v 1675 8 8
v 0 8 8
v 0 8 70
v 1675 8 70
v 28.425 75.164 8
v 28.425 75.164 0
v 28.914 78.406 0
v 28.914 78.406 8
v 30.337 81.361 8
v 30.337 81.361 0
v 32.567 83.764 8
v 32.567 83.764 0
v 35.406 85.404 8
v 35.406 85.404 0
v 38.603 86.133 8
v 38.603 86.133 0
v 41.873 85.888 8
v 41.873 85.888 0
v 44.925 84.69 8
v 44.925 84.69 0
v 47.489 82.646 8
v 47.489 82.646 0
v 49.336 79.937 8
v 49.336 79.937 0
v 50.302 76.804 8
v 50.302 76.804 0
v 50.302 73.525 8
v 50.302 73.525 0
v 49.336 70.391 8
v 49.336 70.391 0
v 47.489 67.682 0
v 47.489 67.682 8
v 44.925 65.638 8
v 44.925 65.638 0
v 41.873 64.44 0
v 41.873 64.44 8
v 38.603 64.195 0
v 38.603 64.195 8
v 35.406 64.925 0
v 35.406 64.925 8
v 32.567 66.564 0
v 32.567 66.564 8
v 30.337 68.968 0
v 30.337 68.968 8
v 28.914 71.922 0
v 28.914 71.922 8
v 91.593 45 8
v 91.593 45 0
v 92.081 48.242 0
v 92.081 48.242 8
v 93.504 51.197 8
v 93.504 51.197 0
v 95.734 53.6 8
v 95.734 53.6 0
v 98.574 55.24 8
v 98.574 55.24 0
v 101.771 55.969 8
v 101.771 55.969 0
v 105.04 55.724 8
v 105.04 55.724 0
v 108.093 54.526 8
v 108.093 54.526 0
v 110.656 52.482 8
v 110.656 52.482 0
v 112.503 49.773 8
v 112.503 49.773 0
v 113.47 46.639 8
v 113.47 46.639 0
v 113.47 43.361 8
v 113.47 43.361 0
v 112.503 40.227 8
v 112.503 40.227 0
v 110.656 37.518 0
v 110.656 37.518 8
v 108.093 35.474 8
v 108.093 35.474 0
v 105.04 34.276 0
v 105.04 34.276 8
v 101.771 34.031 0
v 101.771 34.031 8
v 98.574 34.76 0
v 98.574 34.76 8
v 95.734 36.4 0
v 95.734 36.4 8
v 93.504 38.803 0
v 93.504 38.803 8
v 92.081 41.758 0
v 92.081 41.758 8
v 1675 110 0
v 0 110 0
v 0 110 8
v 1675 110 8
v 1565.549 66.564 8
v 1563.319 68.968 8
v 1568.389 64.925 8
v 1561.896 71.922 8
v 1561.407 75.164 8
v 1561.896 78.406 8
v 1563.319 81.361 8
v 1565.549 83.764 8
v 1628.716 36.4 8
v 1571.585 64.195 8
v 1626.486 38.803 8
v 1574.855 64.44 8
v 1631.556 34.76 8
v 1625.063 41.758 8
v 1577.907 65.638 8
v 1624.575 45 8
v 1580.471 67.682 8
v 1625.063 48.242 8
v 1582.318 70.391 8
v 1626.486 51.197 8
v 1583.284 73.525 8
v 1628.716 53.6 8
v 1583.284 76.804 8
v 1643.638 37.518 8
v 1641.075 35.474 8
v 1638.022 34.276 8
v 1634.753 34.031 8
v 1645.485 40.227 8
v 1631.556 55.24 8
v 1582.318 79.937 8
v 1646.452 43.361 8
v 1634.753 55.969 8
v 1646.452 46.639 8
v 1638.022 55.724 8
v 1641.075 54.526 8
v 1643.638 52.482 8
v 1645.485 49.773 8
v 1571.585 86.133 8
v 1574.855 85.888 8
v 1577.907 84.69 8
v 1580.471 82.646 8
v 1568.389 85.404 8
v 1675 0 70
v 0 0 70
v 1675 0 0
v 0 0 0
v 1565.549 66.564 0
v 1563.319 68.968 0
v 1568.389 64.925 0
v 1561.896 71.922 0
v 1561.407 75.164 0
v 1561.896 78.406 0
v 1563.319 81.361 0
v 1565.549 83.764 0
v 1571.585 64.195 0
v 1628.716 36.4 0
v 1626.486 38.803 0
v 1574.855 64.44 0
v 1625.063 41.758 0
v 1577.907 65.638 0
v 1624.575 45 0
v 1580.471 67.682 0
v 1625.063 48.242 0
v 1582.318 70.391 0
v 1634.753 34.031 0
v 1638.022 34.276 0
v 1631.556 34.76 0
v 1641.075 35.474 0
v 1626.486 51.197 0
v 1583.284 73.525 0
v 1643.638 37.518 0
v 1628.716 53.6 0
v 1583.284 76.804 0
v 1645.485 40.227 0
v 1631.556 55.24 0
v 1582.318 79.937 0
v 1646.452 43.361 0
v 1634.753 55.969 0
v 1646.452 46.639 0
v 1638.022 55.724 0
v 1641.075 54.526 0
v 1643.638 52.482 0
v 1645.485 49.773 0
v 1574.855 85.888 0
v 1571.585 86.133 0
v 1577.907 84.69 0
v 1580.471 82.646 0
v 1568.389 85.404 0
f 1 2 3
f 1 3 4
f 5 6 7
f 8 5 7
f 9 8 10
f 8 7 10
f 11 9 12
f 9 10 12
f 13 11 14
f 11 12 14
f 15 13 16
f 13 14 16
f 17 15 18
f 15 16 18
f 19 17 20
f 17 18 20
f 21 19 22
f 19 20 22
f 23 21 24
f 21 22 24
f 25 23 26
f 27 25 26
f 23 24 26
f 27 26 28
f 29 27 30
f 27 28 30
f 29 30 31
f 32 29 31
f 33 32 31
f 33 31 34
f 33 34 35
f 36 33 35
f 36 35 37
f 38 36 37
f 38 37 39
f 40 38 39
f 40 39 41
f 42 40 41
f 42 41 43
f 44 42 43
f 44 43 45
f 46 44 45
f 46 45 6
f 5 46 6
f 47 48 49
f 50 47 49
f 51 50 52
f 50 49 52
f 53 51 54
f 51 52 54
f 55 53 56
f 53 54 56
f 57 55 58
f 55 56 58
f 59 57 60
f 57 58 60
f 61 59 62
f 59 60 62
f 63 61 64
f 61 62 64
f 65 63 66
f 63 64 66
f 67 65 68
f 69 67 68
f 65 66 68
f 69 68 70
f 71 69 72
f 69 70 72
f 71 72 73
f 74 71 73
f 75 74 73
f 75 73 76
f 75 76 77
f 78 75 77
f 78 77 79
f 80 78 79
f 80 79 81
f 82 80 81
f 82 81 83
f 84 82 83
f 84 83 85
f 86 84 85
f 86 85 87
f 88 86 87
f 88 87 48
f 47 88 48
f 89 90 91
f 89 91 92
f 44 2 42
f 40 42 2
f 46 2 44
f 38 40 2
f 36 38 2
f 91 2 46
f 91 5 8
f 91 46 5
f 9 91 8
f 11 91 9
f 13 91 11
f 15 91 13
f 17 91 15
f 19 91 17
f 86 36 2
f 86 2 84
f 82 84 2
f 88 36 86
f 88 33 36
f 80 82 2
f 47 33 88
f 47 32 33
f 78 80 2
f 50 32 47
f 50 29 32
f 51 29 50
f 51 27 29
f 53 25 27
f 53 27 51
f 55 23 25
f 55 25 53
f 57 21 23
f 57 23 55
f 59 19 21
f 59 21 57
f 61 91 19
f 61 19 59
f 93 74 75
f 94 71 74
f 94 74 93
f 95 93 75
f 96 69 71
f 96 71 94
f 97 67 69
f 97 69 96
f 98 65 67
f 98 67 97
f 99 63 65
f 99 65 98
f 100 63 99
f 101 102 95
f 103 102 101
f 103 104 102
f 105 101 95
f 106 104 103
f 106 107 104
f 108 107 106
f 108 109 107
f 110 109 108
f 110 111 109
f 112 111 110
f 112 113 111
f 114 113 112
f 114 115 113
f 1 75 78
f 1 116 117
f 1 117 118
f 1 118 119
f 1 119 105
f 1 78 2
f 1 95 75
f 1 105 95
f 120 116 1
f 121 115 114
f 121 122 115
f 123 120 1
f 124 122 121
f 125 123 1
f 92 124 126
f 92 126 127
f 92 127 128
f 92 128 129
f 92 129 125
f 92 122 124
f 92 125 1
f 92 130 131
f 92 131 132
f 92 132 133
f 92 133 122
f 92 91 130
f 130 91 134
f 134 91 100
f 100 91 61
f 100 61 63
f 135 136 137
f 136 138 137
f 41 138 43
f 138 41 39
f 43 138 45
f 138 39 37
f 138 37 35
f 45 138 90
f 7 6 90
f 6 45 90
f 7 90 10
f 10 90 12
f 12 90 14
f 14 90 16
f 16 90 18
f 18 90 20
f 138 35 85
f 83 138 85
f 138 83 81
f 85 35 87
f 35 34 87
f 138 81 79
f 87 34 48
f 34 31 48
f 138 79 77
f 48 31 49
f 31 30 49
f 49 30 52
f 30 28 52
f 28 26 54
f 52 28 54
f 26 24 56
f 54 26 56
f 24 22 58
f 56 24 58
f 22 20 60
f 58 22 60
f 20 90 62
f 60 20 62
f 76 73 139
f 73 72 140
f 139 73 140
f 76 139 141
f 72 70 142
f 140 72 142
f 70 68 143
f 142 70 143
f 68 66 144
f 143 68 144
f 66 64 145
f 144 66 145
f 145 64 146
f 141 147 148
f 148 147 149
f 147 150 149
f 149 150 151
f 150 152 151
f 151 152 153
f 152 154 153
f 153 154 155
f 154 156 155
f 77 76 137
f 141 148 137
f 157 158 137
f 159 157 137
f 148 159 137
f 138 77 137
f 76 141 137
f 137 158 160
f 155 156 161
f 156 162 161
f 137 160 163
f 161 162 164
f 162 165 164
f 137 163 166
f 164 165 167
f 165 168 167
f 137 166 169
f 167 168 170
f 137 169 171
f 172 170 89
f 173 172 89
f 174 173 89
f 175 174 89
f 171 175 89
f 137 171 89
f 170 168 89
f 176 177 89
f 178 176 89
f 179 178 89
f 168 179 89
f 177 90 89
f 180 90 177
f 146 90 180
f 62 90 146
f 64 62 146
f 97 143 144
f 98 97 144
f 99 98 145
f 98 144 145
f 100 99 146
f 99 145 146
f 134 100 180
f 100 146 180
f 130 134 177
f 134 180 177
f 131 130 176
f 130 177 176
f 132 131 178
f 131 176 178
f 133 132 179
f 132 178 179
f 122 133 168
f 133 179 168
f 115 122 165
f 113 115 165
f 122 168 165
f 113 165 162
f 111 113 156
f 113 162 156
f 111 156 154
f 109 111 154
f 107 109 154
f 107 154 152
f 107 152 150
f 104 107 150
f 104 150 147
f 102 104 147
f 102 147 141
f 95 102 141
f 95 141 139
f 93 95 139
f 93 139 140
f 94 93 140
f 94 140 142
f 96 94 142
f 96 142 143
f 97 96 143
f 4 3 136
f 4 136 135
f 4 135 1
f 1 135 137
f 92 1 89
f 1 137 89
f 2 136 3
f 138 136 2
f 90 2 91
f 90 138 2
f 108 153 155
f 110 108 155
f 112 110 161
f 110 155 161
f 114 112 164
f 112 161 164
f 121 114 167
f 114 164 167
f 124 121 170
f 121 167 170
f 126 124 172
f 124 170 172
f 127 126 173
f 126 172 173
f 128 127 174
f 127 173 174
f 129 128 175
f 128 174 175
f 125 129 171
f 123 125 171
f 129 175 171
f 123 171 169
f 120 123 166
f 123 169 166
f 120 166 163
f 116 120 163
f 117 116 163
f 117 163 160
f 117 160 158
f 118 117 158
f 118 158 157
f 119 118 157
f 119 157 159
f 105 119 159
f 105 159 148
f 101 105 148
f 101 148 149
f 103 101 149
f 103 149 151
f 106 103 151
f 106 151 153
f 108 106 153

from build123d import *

# Parameters (mm, degrees)
SKETCH_1_W          = 1675
SKETCH_1_H          = 110
EXTRUDE_1_DEPTH     = 8
SKETCH_2_W          = 1675
SKETCH_2_H          = 8
EXTRUDE_2_DEPTH     = 62
SKETCH_3_R          = 11
CUT_EXTRUDE_1_DEPTH = 1681.066962951


with BuildPart() as part:
    # 草图1 → 拉伸1 (new body)
    with BuildSketch(Plane.XY):
        with Locations((837.5, 55)):
            Rectangle(SKETCH_1_W, SKETCH_1_H)
    extrude(amount=EXTRUDE_1_DEPTH)

    # 草图2 → 拉伸2 (add)
    with BuildSketch(Plane.XY.offset(8)):
        with Locations((837.5, 4)):
            Rectangle(SKETCH_2_W, SKETCH_2_H)
    extrude(amount=EXTRUDE_2_DEPTH)

    # 草图3 → 切除-拉伸1 (cut, through all)
    with BuildSketch(Plane(origin=(0, 0, 0), x_dir=(-1, 0, 0), z_dir=(0, 0, -1))):
        with Locations((-1635.574764315, 45)):
            Circle(SKETCH_3_R)
        with Locations((-1572.407333755, 75.164146207)):
            Circle(SKETCH_3_R)
        with Locations((-102.592666245, 45)):
            Circle(SKETCH_3_R)
        with Locations((-39.425235685, 75.164146207)):
            Circle(SKETCH_3_R)
    extrude(amount=-CUT_EXTRUDE_1_DEPTH, mode=Mode.SUBTRACT)


solid = part.part
